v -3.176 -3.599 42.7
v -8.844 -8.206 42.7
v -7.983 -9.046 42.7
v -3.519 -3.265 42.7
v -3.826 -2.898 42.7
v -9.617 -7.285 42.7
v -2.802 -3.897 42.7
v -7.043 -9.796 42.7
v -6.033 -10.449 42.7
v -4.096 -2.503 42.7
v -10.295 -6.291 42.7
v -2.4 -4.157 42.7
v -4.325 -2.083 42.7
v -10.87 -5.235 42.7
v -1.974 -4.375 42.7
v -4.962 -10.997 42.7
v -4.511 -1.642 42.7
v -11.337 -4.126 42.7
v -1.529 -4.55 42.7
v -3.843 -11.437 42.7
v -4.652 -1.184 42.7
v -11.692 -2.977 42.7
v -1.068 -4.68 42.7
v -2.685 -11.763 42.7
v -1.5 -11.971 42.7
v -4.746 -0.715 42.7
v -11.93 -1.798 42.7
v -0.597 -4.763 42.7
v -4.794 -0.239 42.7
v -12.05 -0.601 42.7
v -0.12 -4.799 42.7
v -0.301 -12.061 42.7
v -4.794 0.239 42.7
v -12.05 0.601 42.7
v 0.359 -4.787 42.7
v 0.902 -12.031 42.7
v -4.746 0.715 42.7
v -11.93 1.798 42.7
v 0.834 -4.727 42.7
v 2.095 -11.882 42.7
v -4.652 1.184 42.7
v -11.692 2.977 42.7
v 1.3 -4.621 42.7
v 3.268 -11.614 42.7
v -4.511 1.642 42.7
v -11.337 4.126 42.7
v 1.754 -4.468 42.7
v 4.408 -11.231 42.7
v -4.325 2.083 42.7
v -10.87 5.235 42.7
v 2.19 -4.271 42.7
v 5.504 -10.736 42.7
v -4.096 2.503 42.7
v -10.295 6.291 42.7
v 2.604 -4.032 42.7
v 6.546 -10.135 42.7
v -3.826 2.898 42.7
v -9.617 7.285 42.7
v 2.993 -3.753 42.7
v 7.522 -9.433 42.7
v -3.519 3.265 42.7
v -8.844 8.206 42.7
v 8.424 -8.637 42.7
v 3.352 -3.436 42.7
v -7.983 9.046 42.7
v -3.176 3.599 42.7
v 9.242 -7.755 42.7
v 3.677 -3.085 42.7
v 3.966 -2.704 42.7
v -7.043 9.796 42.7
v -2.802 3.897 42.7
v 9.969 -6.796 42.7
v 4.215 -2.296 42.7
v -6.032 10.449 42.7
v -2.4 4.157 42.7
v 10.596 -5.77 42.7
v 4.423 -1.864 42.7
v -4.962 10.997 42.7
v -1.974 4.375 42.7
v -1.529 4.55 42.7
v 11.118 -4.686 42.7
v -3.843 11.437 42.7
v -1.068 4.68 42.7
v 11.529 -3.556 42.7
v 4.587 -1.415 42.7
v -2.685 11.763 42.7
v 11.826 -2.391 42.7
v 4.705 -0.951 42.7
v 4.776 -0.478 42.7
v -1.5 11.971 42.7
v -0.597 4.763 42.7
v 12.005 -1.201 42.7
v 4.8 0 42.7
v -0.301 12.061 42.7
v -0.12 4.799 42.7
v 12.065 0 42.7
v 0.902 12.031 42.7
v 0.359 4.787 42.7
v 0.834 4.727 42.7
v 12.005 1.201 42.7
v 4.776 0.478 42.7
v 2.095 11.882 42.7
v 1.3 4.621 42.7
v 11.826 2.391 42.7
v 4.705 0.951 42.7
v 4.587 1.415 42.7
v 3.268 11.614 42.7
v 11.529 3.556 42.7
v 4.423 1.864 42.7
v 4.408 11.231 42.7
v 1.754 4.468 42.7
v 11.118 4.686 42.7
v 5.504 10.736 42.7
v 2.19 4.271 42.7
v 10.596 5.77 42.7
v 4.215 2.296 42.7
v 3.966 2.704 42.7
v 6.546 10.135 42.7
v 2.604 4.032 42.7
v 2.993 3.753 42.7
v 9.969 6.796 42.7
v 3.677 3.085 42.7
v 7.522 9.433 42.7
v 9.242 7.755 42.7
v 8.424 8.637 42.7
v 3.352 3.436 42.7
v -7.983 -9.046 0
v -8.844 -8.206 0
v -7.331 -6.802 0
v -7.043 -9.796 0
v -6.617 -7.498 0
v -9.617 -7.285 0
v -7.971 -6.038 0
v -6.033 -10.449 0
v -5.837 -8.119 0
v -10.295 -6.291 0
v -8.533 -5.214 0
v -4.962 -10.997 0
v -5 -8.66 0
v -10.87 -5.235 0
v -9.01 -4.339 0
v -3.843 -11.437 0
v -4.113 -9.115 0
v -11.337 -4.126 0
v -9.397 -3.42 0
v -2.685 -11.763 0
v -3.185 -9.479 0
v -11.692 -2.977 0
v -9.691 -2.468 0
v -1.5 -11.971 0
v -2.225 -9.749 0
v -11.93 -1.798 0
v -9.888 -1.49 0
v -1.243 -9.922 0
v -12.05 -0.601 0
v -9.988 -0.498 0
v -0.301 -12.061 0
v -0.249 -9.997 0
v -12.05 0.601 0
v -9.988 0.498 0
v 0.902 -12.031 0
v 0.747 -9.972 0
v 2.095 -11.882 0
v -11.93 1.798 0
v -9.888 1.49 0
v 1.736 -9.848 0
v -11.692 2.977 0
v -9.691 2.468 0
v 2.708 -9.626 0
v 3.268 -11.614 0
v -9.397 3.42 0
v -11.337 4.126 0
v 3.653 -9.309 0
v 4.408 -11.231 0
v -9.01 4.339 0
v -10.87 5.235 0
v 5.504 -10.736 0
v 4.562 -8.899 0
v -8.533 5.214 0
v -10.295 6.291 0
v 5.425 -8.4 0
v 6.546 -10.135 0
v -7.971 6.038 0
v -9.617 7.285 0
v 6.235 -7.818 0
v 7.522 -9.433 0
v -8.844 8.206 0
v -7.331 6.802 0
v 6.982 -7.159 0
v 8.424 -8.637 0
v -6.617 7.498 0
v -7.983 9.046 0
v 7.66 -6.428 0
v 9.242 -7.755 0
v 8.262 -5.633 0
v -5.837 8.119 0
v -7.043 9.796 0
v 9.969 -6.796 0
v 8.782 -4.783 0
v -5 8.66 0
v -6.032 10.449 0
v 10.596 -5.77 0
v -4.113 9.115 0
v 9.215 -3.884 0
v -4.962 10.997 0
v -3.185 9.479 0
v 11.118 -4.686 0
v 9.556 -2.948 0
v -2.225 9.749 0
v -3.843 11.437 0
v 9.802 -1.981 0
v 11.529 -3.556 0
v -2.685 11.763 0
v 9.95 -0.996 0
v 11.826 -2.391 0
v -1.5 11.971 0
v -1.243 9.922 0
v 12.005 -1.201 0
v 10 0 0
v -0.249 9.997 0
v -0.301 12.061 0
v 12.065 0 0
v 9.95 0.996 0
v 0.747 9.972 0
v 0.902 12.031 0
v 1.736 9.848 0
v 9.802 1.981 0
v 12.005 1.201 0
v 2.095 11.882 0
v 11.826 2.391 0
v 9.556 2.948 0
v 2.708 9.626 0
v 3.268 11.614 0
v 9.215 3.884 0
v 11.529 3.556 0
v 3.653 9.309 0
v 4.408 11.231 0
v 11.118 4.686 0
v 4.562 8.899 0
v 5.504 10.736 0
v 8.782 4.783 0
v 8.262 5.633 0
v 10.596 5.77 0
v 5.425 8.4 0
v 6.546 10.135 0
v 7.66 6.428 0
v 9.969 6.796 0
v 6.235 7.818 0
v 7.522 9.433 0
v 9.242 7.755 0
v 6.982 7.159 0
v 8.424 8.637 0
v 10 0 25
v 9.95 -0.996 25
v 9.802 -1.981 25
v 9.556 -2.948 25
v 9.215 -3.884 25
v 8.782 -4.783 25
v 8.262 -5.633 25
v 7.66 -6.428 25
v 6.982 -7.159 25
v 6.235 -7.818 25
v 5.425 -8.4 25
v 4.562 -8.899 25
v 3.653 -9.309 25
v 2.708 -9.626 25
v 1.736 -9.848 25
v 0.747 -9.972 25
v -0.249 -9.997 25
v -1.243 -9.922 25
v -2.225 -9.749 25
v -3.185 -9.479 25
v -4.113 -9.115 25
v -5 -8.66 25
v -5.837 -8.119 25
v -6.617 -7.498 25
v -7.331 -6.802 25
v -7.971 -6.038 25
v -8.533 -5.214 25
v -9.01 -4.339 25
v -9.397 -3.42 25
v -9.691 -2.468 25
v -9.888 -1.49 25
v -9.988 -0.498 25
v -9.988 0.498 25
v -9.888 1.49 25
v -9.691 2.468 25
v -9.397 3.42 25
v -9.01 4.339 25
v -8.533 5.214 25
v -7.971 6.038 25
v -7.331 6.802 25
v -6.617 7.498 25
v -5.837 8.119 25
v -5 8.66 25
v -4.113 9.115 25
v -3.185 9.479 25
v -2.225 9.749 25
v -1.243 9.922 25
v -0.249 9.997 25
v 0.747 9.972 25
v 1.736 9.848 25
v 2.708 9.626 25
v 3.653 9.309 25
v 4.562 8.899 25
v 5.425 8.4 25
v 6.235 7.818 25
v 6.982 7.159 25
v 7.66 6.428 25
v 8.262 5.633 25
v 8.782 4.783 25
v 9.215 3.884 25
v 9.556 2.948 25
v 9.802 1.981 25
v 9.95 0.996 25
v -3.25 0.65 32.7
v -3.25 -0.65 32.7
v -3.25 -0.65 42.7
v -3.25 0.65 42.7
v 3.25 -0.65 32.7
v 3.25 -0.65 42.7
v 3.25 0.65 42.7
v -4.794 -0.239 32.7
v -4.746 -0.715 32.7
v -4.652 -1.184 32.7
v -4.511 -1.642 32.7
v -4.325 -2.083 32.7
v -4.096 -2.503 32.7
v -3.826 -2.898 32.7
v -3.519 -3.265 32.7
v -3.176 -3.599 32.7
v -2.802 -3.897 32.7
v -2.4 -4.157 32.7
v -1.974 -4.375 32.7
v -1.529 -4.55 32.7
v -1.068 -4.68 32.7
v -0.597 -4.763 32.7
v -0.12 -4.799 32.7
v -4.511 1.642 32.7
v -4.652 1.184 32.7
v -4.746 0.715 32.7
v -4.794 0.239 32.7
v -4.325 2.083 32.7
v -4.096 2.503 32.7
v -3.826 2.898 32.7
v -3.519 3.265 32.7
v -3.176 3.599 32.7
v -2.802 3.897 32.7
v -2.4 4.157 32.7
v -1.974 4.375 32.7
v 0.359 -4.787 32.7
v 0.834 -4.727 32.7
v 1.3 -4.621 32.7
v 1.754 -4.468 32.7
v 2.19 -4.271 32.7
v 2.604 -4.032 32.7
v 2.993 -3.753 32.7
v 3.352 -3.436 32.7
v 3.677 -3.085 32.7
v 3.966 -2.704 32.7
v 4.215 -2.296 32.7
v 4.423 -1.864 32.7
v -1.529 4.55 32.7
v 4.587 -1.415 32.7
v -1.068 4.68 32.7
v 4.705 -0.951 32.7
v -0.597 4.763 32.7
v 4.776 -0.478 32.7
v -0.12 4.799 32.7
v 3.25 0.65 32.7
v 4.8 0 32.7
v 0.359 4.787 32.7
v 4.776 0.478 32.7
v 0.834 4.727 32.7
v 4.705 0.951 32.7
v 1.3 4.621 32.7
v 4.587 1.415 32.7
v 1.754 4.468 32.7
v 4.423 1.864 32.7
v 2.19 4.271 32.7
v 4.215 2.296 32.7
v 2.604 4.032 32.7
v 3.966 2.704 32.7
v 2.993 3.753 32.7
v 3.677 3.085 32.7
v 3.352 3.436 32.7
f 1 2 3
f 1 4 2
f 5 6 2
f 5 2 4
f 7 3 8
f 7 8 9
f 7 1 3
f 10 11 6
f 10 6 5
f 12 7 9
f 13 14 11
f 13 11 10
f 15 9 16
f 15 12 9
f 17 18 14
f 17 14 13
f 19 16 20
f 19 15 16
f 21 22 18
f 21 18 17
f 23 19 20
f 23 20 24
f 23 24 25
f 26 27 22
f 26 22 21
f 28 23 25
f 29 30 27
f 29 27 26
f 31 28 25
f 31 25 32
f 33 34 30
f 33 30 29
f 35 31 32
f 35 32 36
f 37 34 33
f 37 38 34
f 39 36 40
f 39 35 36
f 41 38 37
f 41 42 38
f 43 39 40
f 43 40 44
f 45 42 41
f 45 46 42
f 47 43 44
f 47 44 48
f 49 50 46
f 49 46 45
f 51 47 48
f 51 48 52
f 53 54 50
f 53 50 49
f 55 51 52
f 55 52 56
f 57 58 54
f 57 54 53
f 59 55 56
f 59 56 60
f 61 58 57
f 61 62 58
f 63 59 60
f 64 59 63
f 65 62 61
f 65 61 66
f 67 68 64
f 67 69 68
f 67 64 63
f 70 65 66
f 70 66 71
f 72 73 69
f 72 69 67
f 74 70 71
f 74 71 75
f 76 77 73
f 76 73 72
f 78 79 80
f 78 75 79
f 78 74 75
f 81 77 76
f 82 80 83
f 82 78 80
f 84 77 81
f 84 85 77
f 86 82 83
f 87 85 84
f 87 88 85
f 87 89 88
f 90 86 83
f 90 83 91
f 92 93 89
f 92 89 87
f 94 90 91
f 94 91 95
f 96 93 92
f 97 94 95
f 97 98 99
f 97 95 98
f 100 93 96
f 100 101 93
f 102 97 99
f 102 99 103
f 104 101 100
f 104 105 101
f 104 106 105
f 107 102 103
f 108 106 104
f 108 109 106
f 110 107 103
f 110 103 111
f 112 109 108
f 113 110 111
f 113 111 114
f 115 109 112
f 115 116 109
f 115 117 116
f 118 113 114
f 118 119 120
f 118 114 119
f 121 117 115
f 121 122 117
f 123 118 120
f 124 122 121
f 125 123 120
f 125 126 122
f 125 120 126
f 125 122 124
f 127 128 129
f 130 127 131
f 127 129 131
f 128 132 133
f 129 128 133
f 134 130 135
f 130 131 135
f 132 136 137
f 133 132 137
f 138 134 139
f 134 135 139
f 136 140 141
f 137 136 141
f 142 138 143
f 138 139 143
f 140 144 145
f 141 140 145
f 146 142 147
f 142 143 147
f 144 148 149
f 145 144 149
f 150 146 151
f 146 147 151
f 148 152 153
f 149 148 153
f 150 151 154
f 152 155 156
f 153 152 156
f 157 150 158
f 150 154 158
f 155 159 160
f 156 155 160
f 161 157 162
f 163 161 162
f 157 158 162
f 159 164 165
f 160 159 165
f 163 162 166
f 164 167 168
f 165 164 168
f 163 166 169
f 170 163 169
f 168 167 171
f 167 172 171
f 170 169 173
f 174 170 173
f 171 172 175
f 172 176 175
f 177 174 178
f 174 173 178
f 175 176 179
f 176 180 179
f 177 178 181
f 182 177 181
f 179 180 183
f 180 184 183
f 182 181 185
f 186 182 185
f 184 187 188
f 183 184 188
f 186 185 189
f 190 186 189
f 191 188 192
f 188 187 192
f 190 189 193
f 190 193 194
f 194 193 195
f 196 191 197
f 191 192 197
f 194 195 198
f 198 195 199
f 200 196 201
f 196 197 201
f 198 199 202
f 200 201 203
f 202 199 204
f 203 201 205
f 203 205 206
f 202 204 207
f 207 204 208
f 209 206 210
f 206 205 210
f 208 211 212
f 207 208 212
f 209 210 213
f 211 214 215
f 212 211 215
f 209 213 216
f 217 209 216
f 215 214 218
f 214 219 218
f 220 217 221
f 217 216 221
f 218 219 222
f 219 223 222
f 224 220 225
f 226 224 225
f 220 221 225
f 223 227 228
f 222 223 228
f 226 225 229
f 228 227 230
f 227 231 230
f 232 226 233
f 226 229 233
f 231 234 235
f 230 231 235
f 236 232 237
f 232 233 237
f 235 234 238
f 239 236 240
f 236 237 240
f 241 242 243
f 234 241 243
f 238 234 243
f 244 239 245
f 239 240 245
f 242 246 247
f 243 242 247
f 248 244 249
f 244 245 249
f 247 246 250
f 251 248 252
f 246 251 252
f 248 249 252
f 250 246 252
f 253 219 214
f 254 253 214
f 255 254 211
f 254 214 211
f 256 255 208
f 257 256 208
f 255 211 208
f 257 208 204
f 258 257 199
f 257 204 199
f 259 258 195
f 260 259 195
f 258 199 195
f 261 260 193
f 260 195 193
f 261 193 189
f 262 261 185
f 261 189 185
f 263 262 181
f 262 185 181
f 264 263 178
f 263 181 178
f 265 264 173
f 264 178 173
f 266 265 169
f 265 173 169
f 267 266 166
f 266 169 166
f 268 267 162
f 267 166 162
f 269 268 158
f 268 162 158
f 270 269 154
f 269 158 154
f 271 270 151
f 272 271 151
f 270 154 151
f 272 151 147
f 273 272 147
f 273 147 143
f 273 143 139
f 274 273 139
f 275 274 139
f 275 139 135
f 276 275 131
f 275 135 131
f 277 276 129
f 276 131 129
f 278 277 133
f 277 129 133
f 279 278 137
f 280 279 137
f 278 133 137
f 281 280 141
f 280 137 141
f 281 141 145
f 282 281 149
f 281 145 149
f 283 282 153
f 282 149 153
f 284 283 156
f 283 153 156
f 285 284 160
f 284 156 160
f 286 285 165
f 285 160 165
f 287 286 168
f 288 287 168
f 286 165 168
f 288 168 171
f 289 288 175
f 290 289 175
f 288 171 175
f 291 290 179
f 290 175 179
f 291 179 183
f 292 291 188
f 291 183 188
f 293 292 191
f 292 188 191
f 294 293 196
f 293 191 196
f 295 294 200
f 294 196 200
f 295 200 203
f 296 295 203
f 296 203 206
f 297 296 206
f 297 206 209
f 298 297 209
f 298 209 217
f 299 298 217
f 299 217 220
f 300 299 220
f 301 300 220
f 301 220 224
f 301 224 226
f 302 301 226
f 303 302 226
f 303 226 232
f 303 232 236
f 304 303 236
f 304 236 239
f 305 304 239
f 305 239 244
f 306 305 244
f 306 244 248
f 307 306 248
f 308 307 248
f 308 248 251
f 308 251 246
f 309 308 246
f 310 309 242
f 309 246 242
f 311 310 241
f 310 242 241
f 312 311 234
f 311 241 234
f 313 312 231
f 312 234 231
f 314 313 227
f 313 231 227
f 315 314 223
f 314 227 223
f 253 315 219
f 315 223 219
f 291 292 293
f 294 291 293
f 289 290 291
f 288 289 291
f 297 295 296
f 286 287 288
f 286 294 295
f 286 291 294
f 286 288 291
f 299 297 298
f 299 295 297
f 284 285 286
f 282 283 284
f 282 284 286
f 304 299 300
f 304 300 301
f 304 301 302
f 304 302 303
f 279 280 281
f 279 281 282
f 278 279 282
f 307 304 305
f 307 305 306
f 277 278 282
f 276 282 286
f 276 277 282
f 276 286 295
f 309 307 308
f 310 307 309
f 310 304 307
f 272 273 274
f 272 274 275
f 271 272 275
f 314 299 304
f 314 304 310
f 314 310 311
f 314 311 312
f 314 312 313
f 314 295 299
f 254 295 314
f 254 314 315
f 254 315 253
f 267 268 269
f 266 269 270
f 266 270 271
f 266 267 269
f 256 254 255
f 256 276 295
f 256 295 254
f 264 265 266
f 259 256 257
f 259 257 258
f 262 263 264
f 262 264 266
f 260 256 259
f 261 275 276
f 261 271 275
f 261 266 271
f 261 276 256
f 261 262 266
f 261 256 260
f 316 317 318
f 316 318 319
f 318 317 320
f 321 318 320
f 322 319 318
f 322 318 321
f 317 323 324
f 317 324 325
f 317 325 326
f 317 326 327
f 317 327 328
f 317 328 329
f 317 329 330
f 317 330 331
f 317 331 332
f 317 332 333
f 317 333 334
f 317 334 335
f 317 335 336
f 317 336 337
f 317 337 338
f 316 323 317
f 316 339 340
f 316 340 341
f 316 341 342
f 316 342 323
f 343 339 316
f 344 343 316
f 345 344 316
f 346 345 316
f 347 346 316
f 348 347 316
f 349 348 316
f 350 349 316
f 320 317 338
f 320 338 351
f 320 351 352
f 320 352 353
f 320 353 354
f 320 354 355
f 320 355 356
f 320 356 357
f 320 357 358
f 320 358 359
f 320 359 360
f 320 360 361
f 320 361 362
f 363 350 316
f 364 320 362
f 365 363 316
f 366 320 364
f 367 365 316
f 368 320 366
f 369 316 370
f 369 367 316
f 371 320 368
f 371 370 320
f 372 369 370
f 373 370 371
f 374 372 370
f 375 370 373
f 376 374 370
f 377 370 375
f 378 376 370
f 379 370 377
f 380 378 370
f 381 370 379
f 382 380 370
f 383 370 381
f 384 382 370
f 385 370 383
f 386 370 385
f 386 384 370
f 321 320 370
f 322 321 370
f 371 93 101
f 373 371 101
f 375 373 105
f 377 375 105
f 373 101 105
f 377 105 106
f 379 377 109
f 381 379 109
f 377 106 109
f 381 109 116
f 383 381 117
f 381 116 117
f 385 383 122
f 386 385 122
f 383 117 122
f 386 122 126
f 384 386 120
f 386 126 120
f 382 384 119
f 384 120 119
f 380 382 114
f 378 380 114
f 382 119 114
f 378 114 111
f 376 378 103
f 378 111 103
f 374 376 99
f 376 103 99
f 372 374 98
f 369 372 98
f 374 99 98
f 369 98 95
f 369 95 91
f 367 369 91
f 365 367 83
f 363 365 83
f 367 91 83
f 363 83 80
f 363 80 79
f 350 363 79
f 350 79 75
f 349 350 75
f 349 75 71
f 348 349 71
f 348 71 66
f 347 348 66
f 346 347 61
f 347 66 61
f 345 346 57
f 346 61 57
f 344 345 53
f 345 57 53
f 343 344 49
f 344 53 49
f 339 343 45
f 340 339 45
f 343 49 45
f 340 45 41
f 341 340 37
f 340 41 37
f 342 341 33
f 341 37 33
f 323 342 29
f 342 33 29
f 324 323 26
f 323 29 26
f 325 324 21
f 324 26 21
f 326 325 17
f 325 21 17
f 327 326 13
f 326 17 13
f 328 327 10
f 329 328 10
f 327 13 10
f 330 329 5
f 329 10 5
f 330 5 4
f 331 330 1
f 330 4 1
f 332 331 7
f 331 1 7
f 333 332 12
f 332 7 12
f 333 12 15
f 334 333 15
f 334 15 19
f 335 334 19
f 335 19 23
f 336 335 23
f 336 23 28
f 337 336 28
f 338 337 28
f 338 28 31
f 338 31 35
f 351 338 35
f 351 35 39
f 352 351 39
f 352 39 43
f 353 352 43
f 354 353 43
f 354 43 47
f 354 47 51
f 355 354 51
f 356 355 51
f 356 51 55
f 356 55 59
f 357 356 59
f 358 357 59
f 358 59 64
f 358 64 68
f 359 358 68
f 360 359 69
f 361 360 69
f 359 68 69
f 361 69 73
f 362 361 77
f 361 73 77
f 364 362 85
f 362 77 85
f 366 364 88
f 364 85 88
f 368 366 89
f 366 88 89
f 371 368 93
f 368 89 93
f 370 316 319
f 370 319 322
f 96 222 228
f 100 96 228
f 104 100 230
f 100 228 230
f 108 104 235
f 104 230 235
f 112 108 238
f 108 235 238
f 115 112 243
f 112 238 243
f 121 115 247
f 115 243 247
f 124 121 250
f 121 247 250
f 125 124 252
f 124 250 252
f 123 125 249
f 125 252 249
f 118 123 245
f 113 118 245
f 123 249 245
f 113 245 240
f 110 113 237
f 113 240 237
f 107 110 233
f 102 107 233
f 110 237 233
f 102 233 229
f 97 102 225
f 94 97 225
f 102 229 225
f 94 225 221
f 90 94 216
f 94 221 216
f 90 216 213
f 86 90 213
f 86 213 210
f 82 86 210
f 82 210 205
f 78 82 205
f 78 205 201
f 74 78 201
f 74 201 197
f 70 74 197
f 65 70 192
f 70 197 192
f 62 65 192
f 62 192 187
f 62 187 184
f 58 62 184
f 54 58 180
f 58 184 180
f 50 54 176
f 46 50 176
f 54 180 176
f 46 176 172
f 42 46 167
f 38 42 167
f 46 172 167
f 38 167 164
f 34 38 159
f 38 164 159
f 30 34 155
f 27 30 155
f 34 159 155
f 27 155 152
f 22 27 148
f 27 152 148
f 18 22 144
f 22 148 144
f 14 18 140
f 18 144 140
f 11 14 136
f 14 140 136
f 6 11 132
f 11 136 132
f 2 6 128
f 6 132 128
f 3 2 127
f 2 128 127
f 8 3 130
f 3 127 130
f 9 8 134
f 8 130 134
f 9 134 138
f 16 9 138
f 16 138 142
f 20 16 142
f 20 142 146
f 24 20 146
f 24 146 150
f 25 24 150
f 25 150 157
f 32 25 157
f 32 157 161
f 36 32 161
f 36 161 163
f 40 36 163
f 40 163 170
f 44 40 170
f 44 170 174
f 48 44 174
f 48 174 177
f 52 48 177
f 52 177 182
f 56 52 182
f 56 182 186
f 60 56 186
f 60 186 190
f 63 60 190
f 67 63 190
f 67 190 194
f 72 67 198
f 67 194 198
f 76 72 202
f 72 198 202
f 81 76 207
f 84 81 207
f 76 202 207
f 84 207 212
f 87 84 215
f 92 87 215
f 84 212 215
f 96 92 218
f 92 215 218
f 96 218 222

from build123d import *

# Parameters (mm, degrees)
F0_R     = 12.065
F1_DEPTH = 42.7
F2_R     = 4.8
F3_DEPTH = 10
F4_W     = 6.5
F4_H     = 1.3
F5_DEPTH = 10
F6_R     = 10
F7_DEPTH = 25


with BuildPart() as f1:
    # F0 (on Top) → F1 (new body)
    with BuildSketch(Plane.XY):
        Circle(F0_R)
    extrude(amount=F1_DEPTH)

    # F2 (on face) → F3 (cut)
    with BuildSketch(Plane.XY.offset(42.7)):
        Circle(F2_R)
    extrude(amount=-F3_DEPTH, mode=Mode.SUBTRACT)

    # F4 (on face) → F5 (join)
    with BuildSketch(Plane.XY.offset(32.7)):
        Rectangle(F4_W, F4_H)
    extrude(amount=F5_DEPTH)

    # F6 (on face) → F7 (cut)
    with BuildSketch(Plane(origin=(0, 0, 0), x_dir=(1, 0, 0), z_dir=(0, 0, -1))):
        Circle(F6_R)
    extrude(amount=-F7_DEPTH, mode=Mode.SUBTRACT)


solid = f1.part
